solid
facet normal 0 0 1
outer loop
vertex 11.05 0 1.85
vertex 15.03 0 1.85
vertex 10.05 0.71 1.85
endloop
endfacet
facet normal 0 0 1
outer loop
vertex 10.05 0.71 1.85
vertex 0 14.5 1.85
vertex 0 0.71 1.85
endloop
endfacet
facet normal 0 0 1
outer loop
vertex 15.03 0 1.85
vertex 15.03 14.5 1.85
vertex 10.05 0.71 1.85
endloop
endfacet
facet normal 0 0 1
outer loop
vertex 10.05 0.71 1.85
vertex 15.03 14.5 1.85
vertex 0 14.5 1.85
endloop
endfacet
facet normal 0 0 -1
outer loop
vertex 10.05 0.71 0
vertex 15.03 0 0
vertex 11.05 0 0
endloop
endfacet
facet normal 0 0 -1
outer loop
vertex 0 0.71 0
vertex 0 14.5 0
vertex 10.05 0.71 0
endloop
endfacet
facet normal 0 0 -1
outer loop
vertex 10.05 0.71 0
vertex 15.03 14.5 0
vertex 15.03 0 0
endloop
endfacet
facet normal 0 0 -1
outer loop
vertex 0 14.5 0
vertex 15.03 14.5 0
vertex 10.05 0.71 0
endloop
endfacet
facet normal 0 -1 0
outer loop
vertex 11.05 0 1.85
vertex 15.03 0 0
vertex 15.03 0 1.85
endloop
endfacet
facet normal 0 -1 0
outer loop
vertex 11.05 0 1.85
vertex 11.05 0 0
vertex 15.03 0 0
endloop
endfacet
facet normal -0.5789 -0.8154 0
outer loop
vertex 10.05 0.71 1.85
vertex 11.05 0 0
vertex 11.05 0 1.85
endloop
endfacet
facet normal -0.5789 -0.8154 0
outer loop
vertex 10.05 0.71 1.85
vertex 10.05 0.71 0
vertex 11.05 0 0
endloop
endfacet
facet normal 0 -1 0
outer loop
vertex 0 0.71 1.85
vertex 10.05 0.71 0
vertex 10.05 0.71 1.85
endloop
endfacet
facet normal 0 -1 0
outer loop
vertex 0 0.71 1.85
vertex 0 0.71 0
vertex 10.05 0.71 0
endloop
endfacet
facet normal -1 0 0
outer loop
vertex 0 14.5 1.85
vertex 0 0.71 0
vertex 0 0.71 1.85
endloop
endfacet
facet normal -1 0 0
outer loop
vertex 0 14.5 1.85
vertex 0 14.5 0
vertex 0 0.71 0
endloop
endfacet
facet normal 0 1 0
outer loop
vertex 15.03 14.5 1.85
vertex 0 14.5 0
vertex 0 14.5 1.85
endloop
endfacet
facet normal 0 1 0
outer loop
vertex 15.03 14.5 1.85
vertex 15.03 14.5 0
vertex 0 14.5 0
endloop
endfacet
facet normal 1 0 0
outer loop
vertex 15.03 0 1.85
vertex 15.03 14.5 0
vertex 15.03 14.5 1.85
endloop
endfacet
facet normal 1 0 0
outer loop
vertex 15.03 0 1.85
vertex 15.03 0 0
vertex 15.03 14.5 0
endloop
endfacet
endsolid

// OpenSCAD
module uSD() {
    // Dimensions - mm
    sd_w = 57.49-42.46;
    sd_t = 1.85;
    pts = [[0,0],
           [sd_w,0],
           [sd_w,14.5],
           [11.05,14.5],
           [10.05,13.79],
           [0,13.79]];
    color("Silver") {
        translate([0,14.5,sd_t]) {       
            rotate([180,0,0]) {
                linear_extrude(height=sd_t)polygon(pts);
            }
        }
    }
}

uSD();
